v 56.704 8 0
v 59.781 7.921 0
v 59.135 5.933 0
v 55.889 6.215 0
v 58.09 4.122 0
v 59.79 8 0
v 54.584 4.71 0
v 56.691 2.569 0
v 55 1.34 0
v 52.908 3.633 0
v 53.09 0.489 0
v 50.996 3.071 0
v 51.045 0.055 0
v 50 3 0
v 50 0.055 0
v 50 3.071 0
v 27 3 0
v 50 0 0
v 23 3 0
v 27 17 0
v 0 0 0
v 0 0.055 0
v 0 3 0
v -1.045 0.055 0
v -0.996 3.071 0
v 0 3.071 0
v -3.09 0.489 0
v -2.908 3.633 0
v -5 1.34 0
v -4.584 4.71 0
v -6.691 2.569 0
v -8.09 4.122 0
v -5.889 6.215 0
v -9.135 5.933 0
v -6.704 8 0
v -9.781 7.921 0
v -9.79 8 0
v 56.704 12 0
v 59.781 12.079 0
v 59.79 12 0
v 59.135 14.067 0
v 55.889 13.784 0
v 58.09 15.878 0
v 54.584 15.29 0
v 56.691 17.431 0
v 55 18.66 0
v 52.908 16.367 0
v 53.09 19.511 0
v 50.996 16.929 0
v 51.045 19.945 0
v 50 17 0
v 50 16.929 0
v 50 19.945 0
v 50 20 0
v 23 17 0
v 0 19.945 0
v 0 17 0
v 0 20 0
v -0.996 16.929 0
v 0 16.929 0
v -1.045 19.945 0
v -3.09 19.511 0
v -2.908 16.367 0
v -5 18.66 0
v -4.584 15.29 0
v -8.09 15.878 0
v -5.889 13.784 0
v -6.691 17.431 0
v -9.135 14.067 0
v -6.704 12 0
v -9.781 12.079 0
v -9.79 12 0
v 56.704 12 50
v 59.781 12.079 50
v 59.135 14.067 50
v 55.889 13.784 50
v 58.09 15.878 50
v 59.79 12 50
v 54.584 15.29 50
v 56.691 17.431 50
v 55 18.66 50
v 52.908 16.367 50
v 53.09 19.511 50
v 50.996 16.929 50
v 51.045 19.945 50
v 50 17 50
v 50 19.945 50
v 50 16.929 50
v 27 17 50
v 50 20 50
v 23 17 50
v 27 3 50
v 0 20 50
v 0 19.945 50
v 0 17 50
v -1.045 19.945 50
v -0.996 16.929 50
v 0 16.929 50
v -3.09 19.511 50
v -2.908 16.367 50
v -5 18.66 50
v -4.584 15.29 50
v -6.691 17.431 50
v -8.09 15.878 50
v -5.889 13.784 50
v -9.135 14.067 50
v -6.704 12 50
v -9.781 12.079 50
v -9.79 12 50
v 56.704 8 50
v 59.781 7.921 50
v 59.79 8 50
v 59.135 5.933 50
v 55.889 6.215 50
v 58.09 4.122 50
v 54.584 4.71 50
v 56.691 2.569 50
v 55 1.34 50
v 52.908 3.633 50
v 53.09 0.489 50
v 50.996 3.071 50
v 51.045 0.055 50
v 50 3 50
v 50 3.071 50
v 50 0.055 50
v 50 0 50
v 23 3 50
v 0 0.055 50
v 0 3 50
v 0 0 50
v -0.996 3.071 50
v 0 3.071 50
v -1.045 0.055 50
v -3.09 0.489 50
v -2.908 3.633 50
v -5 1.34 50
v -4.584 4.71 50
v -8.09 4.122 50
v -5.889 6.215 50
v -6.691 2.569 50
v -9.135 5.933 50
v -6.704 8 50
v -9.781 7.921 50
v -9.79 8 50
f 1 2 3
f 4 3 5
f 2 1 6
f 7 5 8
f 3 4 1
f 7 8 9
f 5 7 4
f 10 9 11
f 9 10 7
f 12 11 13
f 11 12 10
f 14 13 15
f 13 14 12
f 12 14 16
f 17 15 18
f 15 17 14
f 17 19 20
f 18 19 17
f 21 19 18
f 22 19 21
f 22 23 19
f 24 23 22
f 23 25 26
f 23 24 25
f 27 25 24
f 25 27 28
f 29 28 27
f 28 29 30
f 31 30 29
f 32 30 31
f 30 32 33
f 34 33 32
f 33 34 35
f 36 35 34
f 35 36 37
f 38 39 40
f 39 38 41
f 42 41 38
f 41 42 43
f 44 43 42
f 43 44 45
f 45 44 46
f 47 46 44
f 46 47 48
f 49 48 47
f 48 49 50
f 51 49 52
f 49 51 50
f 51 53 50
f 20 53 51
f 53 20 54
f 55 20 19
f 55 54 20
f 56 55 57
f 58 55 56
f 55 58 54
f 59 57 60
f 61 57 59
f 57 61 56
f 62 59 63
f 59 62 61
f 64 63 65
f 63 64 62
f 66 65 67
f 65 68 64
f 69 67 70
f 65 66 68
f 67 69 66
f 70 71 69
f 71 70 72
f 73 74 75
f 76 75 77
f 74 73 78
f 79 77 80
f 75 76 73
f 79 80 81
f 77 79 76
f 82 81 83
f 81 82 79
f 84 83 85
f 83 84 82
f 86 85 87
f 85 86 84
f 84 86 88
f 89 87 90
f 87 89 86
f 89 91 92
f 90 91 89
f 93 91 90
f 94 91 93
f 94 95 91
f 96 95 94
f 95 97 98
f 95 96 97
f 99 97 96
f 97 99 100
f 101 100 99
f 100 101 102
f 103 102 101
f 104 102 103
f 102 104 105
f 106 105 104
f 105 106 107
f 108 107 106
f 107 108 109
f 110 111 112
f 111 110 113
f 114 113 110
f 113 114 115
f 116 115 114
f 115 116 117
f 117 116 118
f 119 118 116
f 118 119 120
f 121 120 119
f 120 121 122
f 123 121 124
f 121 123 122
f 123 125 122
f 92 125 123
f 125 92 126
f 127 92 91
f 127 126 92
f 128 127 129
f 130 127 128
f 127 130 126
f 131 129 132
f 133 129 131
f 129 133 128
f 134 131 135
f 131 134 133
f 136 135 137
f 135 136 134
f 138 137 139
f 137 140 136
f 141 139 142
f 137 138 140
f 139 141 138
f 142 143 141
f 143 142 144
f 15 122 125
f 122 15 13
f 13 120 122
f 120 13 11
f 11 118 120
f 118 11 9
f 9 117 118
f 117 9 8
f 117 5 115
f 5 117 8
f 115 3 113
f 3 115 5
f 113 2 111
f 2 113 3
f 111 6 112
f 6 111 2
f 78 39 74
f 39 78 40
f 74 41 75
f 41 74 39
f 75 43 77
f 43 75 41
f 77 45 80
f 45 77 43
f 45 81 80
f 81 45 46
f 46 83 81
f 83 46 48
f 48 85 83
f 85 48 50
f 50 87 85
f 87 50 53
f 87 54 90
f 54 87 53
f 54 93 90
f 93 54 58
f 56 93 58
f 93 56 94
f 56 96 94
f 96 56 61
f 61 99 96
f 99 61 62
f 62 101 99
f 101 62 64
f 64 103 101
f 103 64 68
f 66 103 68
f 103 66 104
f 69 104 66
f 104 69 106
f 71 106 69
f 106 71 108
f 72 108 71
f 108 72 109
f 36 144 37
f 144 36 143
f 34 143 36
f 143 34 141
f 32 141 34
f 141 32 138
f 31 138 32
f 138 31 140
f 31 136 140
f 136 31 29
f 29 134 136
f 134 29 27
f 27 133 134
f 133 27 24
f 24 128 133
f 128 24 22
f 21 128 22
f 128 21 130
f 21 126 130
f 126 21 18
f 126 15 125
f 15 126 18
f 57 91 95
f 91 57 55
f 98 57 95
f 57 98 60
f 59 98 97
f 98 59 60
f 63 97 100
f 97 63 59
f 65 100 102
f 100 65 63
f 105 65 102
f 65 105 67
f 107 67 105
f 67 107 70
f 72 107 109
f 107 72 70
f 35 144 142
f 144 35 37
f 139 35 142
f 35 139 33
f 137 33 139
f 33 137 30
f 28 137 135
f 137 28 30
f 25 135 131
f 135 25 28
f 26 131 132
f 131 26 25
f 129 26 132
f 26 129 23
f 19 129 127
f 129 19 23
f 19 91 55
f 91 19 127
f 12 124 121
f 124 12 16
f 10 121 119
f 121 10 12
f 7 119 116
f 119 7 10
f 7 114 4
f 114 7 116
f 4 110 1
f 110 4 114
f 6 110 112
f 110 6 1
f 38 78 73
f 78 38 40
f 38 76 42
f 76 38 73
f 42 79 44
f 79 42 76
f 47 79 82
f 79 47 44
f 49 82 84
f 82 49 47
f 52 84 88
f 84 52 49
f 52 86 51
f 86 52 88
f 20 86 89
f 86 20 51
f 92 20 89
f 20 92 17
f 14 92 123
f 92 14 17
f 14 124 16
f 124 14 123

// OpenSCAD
//Height
h=50; //[20,30,50,70]

//Width
b=20; 

//Length
l=50;

//Cable_gap
f=4; //[2,3,4,5,6,7,8,9]


difference () {linear_extrude (h) {union () {square([l,b]);
translate ([0,b/2,0]) circle (b/2);
    translate ([l,b/2,0]) circle (b/2);
    }
}

linear_extrude (h) {union () {translate ([0,b/2,h]) circle ((b-
  6)/2);
translate ([0,3,h]) square ([(l/2)-2,b-6]);
    translate ([-b/2,(b/2)-(f/2),h]) square ([10,f]);
}
}

linear_extrude (h) {union () {translate ([l+(b/4),(b/2)-(f/2),h]) square ([10,f]); 
    translate ([l,0,0]) {mirror () {translate ([0,b/2,h]) circle ((b-6)/2);
translate ([0,3,h]) square ([(l/2)-2,b-6]);
    }
}
}
}
}


    


           
          
          
